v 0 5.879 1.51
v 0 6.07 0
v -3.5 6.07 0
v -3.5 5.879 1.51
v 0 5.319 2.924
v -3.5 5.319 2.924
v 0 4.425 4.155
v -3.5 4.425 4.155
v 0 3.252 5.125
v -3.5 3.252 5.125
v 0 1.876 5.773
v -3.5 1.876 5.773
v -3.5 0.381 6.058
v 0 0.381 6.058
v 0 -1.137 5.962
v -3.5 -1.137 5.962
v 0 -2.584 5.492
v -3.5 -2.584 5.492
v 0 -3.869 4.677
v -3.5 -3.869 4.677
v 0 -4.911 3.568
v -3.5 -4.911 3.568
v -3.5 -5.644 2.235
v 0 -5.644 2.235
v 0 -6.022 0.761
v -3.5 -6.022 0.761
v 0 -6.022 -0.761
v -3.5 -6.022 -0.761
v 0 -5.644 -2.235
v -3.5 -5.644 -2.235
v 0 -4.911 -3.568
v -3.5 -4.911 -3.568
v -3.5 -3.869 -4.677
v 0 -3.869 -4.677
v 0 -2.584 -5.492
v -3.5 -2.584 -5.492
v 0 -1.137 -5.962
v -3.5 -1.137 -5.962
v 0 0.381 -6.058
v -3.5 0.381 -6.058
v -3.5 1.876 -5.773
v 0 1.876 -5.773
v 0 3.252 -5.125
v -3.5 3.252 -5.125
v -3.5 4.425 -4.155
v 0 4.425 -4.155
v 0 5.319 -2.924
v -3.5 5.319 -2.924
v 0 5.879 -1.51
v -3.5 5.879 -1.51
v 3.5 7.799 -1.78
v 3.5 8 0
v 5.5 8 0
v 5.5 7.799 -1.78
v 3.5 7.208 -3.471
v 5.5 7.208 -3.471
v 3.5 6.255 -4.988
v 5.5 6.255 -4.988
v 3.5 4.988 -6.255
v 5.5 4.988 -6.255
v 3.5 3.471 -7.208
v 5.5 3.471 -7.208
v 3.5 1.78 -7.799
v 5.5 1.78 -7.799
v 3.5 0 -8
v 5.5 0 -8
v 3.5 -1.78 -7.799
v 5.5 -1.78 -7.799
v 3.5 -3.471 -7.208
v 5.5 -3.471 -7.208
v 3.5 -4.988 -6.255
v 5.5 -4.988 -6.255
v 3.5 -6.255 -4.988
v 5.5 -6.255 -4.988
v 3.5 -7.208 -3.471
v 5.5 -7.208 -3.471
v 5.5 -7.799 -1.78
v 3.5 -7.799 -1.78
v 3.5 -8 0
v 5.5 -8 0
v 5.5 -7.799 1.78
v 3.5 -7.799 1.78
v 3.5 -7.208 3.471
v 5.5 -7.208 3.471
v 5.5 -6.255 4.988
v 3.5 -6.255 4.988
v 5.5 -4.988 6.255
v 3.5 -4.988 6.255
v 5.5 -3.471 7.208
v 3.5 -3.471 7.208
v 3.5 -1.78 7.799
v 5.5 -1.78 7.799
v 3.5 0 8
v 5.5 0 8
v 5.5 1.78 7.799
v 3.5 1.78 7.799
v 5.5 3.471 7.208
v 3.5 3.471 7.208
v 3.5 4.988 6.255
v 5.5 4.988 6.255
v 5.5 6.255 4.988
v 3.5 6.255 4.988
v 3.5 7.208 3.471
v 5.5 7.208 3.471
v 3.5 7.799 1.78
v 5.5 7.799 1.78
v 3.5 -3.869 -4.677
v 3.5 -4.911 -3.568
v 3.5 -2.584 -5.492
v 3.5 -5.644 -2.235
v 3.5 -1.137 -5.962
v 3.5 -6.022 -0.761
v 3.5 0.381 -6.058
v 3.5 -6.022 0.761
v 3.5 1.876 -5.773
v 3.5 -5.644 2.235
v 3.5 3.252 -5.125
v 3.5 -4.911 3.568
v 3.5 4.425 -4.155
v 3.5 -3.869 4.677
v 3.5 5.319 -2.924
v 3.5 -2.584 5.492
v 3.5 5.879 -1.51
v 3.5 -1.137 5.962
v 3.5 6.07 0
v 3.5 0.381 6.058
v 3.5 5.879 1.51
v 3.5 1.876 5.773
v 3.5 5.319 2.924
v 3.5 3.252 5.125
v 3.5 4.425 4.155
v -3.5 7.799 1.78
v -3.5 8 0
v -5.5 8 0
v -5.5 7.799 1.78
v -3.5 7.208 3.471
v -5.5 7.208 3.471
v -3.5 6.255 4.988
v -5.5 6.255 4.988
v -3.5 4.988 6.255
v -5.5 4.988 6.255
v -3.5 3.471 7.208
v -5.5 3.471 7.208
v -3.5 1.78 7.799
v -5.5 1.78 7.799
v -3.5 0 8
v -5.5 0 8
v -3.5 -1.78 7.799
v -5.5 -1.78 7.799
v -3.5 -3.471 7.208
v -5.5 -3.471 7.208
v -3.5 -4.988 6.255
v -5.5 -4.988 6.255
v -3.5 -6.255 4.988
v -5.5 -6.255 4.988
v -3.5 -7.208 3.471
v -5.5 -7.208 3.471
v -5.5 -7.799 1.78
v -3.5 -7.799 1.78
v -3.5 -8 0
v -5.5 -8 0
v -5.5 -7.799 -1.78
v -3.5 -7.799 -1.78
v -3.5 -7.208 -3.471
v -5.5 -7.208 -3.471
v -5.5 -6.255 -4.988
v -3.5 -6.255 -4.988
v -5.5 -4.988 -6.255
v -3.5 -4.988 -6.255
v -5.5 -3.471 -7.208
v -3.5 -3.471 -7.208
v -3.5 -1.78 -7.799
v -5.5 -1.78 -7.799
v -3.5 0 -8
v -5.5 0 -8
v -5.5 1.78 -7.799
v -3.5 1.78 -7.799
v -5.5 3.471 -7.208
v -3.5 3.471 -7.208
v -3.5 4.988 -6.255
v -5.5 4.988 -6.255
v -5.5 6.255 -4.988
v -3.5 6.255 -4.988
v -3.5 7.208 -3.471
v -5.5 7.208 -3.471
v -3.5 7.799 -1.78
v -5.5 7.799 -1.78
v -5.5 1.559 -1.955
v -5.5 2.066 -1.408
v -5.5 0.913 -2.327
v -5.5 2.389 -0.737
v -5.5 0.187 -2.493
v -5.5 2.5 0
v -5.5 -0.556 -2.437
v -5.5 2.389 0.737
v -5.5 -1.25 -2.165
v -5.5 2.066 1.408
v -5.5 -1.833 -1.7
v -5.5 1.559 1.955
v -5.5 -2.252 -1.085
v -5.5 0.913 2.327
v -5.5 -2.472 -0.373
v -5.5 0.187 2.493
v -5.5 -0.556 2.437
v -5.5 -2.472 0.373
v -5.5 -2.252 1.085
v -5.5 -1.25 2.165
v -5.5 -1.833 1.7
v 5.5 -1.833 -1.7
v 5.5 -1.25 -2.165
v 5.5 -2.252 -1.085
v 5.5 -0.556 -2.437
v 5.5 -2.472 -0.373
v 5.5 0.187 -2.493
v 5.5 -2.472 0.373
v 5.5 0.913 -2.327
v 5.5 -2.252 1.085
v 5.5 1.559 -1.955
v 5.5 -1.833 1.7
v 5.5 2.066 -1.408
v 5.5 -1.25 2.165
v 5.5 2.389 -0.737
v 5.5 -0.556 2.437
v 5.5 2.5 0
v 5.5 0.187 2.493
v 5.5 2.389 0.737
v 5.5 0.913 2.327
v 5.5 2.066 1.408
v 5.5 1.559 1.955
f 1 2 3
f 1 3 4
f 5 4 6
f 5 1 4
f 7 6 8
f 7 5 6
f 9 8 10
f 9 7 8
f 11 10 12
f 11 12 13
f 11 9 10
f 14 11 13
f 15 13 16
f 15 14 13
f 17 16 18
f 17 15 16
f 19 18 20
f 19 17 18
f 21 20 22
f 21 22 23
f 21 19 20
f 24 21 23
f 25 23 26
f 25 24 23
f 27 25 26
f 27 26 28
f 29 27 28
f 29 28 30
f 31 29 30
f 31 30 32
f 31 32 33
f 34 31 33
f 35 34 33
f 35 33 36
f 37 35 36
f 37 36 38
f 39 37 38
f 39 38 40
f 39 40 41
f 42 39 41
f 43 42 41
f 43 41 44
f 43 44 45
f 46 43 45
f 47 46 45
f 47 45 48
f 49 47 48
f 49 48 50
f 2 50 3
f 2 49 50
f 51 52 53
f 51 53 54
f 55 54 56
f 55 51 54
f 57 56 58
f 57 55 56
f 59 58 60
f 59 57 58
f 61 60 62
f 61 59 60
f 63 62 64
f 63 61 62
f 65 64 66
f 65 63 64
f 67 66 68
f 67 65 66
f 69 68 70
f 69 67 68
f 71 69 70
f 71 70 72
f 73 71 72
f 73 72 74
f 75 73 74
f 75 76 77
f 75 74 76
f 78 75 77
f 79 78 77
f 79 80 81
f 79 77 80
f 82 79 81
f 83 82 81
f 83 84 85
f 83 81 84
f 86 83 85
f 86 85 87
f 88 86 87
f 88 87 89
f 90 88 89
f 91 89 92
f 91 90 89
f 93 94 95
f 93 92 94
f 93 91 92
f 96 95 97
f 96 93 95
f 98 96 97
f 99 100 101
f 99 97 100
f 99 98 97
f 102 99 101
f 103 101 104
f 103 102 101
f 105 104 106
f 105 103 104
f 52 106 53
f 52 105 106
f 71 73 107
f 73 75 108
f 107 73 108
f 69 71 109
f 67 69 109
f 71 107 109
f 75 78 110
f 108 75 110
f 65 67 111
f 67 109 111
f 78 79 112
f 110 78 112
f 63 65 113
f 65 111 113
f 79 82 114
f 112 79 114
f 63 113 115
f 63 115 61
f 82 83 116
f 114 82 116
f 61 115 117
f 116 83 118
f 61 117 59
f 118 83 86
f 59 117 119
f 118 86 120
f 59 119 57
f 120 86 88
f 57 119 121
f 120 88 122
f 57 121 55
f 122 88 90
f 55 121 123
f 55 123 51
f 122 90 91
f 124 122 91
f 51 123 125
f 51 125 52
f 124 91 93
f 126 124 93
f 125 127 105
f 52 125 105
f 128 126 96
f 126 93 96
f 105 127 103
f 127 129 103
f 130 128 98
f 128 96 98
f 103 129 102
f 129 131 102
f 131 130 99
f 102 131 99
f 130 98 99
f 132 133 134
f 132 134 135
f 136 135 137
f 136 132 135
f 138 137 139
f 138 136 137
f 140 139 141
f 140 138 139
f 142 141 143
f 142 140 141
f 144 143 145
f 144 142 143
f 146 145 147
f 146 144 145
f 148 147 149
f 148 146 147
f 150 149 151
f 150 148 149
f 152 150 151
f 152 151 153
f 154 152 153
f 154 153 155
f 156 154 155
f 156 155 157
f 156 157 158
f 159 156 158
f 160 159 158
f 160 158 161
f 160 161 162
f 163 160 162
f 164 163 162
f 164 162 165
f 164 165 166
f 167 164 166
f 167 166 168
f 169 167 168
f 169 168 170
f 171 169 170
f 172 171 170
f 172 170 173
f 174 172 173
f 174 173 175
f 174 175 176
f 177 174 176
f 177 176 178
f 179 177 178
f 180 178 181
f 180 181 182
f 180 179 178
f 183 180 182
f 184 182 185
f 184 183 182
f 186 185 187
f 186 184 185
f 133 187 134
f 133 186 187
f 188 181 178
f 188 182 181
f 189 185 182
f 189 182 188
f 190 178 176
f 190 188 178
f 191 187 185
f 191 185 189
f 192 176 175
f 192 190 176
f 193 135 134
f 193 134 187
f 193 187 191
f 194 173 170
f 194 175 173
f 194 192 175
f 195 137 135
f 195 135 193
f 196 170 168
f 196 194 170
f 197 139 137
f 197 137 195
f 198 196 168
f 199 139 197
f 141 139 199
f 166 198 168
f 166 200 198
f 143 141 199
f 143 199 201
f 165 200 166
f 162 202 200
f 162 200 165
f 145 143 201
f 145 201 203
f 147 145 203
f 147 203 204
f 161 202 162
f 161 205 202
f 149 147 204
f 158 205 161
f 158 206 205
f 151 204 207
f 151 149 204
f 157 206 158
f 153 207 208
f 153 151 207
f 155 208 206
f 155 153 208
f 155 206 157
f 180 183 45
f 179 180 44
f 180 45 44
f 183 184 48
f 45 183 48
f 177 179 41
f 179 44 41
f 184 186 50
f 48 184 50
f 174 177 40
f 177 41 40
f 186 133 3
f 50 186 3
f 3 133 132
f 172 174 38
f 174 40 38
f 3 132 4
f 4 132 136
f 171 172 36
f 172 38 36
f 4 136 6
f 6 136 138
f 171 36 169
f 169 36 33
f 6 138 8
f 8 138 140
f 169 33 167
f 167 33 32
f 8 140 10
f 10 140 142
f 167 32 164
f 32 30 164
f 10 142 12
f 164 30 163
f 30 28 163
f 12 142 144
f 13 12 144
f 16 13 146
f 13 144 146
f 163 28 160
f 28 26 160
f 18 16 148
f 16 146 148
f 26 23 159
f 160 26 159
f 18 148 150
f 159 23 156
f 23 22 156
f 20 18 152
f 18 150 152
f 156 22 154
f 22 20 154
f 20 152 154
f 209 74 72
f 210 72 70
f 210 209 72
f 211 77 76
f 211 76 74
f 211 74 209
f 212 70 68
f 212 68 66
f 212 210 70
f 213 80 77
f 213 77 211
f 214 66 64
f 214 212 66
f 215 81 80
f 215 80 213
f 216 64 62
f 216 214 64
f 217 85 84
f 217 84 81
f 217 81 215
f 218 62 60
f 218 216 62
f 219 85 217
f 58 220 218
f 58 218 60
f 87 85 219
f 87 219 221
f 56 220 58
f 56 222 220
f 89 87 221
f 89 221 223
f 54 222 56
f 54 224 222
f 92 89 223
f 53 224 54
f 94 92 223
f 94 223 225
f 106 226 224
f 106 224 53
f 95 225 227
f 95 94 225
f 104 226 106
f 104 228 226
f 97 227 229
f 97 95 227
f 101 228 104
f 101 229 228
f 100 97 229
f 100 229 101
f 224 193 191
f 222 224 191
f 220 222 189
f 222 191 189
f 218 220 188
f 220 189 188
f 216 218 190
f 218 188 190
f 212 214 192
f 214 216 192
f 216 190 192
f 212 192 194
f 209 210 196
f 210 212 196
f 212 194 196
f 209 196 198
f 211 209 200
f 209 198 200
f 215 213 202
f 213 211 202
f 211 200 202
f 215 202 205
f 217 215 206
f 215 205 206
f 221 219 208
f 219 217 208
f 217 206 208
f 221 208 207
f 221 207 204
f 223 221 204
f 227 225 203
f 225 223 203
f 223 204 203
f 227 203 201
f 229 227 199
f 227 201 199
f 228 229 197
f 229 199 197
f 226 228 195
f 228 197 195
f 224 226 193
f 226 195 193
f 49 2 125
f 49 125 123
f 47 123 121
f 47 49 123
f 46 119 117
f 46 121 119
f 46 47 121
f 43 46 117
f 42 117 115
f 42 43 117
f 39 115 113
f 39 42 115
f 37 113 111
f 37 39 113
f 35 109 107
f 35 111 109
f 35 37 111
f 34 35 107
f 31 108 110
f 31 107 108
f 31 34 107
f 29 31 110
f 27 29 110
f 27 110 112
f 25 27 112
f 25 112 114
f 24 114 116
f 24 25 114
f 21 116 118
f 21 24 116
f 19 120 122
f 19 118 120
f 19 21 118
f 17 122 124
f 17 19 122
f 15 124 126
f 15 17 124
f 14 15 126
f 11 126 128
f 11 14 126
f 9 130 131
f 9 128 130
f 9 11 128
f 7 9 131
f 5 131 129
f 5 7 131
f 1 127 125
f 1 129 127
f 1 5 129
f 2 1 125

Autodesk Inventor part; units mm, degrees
ref_plane "YZ Plane" through (0, 0, 0) normal (1, 0, 0) x (0, 1, 0)
ref_plane "XZ Plane" through (0, 0, 0) normal (0, 1, 0) x (-1, 0, 0)
ref_plane "XY Plane" through (0, 0, 0) normal (0, 0, 1) x (1, 0, 0)
sketch "Sketch1" plane through (0, 0, 0) normal (0, 0, 1) x (1, 0, 0)
  line L0 (5.5, 2.5) -> (5.5, 8)
  line L1 (5.5, 8) -> (3.5, 8)
  line L2 (3.5, 8) -> (3.5, 6.07)
  line L3 (3.5, 6.07) -> (0, 6.07)
  line L4 (5.5, 2.5) -> (0, 2.5)
  line L5 (0, 2.5) -> (0, 6.07)
  line L6 (-2.3, 0) -> (6.8, 0) projected
  line L7 (0, 0) -> (0, 17.5) projected
  line L8 (0, 9) -> (0, 2.5)
  line L9 (0, 15) -> (0, 9)
  point P0 (0, 4.285)
  point P1 (-1, 12)
  point P2 (4.5, 8)
  dimension "d0" = 5.5
  dimension "d1" = 3.5
  dimension "d2" = 6.07
  dimension "d3" = 8
  dimension "d4" = 2.5
  dimension "d8" = 1
revolve "Revolution1" add sketch "Sketch1" angle 360 about axis through (-10, 0, 0) along (1, 0, 0)
mirror "Mirror2" about plane through (0, 0, 0) normal (1, 0, 0) of "Revolution1"
properties part number "Idler_Pulley" material "Aluminum 6061"
